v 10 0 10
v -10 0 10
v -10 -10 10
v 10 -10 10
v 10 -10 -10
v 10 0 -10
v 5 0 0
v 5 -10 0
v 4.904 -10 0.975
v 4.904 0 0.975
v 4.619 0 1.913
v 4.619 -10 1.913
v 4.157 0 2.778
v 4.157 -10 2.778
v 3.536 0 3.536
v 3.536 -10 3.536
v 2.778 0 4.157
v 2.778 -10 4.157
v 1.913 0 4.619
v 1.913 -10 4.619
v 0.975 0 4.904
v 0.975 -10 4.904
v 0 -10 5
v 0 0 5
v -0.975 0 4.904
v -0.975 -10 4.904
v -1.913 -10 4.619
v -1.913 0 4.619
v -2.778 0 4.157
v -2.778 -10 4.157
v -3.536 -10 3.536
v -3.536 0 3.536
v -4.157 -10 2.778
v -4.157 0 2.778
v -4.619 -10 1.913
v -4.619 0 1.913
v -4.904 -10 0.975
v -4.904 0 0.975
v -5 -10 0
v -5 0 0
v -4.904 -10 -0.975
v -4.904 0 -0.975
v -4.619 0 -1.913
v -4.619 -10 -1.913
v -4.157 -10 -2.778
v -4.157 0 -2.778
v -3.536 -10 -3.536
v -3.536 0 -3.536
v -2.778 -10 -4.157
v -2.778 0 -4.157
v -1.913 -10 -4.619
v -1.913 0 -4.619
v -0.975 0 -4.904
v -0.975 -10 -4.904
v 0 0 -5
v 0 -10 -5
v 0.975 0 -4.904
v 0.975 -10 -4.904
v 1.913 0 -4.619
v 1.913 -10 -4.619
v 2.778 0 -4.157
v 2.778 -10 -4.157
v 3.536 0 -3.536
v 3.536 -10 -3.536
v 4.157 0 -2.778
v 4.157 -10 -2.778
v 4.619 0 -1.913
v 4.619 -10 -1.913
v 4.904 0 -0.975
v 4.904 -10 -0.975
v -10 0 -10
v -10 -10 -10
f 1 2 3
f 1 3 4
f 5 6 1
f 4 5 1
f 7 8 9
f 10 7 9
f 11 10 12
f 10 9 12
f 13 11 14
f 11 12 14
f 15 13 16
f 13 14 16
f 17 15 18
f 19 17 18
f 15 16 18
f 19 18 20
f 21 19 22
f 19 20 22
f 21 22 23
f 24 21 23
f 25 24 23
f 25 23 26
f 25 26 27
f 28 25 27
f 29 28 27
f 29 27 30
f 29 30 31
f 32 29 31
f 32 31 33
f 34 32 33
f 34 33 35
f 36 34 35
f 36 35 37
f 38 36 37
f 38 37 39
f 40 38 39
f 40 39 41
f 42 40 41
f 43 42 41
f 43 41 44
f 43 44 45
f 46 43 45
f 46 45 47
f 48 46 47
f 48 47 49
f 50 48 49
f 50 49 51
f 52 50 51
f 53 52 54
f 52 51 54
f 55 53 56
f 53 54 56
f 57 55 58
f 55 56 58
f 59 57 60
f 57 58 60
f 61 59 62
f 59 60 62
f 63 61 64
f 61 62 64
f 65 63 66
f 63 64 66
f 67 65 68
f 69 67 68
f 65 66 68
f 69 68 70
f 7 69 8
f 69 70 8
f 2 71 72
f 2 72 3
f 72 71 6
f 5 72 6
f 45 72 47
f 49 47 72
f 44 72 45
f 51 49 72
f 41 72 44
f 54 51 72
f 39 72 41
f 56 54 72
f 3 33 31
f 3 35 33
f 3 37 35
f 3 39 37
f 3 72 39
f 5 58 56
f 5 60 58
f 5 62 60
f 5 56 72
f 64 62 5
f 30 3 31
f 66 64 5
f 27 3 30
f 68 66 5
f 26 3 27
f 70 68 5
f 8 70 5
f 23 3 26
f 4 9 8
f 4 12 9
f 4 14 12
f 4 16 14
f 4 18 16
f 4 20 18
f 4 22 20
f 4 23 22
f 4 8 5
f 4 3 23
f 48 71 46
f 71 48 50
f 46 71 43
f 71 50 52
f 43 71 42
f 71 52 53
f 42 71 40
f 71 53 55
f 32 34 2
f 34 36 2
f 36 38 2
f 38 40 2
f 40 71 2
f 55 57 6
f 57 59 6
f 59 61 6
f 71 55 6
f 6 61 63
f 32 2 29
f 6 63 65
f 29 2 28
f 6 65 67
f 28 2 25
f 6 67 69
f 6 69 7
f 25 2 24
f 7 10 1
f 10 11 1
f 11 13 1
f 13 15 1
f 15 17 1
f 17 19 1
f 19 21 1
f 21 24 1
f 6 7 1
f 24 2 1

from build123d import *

# Parameters (mm, degrees)
F0_W     = 20
F0_H     = 20
F1_DEPTH = 10
F2_R     = 5
F3_DEPTH = 10.001


with BuildPart() as f1:
    # F0 (on Front) → F1 (new body)
    with BuildSketch(Plane.XZ):
        Rectangle(F0_W, F0_H)
    extrude(amount=F1_DEPTH)

    # F2 (on face) → F3 (cut, through all)
    with BuildSketch(Plane.XZ.offset(10)):
        Circle(F2_R)
    extrude(amount=-F3_DEPTH, mode=Mode.SUBTRACT)


solid = f1.part
